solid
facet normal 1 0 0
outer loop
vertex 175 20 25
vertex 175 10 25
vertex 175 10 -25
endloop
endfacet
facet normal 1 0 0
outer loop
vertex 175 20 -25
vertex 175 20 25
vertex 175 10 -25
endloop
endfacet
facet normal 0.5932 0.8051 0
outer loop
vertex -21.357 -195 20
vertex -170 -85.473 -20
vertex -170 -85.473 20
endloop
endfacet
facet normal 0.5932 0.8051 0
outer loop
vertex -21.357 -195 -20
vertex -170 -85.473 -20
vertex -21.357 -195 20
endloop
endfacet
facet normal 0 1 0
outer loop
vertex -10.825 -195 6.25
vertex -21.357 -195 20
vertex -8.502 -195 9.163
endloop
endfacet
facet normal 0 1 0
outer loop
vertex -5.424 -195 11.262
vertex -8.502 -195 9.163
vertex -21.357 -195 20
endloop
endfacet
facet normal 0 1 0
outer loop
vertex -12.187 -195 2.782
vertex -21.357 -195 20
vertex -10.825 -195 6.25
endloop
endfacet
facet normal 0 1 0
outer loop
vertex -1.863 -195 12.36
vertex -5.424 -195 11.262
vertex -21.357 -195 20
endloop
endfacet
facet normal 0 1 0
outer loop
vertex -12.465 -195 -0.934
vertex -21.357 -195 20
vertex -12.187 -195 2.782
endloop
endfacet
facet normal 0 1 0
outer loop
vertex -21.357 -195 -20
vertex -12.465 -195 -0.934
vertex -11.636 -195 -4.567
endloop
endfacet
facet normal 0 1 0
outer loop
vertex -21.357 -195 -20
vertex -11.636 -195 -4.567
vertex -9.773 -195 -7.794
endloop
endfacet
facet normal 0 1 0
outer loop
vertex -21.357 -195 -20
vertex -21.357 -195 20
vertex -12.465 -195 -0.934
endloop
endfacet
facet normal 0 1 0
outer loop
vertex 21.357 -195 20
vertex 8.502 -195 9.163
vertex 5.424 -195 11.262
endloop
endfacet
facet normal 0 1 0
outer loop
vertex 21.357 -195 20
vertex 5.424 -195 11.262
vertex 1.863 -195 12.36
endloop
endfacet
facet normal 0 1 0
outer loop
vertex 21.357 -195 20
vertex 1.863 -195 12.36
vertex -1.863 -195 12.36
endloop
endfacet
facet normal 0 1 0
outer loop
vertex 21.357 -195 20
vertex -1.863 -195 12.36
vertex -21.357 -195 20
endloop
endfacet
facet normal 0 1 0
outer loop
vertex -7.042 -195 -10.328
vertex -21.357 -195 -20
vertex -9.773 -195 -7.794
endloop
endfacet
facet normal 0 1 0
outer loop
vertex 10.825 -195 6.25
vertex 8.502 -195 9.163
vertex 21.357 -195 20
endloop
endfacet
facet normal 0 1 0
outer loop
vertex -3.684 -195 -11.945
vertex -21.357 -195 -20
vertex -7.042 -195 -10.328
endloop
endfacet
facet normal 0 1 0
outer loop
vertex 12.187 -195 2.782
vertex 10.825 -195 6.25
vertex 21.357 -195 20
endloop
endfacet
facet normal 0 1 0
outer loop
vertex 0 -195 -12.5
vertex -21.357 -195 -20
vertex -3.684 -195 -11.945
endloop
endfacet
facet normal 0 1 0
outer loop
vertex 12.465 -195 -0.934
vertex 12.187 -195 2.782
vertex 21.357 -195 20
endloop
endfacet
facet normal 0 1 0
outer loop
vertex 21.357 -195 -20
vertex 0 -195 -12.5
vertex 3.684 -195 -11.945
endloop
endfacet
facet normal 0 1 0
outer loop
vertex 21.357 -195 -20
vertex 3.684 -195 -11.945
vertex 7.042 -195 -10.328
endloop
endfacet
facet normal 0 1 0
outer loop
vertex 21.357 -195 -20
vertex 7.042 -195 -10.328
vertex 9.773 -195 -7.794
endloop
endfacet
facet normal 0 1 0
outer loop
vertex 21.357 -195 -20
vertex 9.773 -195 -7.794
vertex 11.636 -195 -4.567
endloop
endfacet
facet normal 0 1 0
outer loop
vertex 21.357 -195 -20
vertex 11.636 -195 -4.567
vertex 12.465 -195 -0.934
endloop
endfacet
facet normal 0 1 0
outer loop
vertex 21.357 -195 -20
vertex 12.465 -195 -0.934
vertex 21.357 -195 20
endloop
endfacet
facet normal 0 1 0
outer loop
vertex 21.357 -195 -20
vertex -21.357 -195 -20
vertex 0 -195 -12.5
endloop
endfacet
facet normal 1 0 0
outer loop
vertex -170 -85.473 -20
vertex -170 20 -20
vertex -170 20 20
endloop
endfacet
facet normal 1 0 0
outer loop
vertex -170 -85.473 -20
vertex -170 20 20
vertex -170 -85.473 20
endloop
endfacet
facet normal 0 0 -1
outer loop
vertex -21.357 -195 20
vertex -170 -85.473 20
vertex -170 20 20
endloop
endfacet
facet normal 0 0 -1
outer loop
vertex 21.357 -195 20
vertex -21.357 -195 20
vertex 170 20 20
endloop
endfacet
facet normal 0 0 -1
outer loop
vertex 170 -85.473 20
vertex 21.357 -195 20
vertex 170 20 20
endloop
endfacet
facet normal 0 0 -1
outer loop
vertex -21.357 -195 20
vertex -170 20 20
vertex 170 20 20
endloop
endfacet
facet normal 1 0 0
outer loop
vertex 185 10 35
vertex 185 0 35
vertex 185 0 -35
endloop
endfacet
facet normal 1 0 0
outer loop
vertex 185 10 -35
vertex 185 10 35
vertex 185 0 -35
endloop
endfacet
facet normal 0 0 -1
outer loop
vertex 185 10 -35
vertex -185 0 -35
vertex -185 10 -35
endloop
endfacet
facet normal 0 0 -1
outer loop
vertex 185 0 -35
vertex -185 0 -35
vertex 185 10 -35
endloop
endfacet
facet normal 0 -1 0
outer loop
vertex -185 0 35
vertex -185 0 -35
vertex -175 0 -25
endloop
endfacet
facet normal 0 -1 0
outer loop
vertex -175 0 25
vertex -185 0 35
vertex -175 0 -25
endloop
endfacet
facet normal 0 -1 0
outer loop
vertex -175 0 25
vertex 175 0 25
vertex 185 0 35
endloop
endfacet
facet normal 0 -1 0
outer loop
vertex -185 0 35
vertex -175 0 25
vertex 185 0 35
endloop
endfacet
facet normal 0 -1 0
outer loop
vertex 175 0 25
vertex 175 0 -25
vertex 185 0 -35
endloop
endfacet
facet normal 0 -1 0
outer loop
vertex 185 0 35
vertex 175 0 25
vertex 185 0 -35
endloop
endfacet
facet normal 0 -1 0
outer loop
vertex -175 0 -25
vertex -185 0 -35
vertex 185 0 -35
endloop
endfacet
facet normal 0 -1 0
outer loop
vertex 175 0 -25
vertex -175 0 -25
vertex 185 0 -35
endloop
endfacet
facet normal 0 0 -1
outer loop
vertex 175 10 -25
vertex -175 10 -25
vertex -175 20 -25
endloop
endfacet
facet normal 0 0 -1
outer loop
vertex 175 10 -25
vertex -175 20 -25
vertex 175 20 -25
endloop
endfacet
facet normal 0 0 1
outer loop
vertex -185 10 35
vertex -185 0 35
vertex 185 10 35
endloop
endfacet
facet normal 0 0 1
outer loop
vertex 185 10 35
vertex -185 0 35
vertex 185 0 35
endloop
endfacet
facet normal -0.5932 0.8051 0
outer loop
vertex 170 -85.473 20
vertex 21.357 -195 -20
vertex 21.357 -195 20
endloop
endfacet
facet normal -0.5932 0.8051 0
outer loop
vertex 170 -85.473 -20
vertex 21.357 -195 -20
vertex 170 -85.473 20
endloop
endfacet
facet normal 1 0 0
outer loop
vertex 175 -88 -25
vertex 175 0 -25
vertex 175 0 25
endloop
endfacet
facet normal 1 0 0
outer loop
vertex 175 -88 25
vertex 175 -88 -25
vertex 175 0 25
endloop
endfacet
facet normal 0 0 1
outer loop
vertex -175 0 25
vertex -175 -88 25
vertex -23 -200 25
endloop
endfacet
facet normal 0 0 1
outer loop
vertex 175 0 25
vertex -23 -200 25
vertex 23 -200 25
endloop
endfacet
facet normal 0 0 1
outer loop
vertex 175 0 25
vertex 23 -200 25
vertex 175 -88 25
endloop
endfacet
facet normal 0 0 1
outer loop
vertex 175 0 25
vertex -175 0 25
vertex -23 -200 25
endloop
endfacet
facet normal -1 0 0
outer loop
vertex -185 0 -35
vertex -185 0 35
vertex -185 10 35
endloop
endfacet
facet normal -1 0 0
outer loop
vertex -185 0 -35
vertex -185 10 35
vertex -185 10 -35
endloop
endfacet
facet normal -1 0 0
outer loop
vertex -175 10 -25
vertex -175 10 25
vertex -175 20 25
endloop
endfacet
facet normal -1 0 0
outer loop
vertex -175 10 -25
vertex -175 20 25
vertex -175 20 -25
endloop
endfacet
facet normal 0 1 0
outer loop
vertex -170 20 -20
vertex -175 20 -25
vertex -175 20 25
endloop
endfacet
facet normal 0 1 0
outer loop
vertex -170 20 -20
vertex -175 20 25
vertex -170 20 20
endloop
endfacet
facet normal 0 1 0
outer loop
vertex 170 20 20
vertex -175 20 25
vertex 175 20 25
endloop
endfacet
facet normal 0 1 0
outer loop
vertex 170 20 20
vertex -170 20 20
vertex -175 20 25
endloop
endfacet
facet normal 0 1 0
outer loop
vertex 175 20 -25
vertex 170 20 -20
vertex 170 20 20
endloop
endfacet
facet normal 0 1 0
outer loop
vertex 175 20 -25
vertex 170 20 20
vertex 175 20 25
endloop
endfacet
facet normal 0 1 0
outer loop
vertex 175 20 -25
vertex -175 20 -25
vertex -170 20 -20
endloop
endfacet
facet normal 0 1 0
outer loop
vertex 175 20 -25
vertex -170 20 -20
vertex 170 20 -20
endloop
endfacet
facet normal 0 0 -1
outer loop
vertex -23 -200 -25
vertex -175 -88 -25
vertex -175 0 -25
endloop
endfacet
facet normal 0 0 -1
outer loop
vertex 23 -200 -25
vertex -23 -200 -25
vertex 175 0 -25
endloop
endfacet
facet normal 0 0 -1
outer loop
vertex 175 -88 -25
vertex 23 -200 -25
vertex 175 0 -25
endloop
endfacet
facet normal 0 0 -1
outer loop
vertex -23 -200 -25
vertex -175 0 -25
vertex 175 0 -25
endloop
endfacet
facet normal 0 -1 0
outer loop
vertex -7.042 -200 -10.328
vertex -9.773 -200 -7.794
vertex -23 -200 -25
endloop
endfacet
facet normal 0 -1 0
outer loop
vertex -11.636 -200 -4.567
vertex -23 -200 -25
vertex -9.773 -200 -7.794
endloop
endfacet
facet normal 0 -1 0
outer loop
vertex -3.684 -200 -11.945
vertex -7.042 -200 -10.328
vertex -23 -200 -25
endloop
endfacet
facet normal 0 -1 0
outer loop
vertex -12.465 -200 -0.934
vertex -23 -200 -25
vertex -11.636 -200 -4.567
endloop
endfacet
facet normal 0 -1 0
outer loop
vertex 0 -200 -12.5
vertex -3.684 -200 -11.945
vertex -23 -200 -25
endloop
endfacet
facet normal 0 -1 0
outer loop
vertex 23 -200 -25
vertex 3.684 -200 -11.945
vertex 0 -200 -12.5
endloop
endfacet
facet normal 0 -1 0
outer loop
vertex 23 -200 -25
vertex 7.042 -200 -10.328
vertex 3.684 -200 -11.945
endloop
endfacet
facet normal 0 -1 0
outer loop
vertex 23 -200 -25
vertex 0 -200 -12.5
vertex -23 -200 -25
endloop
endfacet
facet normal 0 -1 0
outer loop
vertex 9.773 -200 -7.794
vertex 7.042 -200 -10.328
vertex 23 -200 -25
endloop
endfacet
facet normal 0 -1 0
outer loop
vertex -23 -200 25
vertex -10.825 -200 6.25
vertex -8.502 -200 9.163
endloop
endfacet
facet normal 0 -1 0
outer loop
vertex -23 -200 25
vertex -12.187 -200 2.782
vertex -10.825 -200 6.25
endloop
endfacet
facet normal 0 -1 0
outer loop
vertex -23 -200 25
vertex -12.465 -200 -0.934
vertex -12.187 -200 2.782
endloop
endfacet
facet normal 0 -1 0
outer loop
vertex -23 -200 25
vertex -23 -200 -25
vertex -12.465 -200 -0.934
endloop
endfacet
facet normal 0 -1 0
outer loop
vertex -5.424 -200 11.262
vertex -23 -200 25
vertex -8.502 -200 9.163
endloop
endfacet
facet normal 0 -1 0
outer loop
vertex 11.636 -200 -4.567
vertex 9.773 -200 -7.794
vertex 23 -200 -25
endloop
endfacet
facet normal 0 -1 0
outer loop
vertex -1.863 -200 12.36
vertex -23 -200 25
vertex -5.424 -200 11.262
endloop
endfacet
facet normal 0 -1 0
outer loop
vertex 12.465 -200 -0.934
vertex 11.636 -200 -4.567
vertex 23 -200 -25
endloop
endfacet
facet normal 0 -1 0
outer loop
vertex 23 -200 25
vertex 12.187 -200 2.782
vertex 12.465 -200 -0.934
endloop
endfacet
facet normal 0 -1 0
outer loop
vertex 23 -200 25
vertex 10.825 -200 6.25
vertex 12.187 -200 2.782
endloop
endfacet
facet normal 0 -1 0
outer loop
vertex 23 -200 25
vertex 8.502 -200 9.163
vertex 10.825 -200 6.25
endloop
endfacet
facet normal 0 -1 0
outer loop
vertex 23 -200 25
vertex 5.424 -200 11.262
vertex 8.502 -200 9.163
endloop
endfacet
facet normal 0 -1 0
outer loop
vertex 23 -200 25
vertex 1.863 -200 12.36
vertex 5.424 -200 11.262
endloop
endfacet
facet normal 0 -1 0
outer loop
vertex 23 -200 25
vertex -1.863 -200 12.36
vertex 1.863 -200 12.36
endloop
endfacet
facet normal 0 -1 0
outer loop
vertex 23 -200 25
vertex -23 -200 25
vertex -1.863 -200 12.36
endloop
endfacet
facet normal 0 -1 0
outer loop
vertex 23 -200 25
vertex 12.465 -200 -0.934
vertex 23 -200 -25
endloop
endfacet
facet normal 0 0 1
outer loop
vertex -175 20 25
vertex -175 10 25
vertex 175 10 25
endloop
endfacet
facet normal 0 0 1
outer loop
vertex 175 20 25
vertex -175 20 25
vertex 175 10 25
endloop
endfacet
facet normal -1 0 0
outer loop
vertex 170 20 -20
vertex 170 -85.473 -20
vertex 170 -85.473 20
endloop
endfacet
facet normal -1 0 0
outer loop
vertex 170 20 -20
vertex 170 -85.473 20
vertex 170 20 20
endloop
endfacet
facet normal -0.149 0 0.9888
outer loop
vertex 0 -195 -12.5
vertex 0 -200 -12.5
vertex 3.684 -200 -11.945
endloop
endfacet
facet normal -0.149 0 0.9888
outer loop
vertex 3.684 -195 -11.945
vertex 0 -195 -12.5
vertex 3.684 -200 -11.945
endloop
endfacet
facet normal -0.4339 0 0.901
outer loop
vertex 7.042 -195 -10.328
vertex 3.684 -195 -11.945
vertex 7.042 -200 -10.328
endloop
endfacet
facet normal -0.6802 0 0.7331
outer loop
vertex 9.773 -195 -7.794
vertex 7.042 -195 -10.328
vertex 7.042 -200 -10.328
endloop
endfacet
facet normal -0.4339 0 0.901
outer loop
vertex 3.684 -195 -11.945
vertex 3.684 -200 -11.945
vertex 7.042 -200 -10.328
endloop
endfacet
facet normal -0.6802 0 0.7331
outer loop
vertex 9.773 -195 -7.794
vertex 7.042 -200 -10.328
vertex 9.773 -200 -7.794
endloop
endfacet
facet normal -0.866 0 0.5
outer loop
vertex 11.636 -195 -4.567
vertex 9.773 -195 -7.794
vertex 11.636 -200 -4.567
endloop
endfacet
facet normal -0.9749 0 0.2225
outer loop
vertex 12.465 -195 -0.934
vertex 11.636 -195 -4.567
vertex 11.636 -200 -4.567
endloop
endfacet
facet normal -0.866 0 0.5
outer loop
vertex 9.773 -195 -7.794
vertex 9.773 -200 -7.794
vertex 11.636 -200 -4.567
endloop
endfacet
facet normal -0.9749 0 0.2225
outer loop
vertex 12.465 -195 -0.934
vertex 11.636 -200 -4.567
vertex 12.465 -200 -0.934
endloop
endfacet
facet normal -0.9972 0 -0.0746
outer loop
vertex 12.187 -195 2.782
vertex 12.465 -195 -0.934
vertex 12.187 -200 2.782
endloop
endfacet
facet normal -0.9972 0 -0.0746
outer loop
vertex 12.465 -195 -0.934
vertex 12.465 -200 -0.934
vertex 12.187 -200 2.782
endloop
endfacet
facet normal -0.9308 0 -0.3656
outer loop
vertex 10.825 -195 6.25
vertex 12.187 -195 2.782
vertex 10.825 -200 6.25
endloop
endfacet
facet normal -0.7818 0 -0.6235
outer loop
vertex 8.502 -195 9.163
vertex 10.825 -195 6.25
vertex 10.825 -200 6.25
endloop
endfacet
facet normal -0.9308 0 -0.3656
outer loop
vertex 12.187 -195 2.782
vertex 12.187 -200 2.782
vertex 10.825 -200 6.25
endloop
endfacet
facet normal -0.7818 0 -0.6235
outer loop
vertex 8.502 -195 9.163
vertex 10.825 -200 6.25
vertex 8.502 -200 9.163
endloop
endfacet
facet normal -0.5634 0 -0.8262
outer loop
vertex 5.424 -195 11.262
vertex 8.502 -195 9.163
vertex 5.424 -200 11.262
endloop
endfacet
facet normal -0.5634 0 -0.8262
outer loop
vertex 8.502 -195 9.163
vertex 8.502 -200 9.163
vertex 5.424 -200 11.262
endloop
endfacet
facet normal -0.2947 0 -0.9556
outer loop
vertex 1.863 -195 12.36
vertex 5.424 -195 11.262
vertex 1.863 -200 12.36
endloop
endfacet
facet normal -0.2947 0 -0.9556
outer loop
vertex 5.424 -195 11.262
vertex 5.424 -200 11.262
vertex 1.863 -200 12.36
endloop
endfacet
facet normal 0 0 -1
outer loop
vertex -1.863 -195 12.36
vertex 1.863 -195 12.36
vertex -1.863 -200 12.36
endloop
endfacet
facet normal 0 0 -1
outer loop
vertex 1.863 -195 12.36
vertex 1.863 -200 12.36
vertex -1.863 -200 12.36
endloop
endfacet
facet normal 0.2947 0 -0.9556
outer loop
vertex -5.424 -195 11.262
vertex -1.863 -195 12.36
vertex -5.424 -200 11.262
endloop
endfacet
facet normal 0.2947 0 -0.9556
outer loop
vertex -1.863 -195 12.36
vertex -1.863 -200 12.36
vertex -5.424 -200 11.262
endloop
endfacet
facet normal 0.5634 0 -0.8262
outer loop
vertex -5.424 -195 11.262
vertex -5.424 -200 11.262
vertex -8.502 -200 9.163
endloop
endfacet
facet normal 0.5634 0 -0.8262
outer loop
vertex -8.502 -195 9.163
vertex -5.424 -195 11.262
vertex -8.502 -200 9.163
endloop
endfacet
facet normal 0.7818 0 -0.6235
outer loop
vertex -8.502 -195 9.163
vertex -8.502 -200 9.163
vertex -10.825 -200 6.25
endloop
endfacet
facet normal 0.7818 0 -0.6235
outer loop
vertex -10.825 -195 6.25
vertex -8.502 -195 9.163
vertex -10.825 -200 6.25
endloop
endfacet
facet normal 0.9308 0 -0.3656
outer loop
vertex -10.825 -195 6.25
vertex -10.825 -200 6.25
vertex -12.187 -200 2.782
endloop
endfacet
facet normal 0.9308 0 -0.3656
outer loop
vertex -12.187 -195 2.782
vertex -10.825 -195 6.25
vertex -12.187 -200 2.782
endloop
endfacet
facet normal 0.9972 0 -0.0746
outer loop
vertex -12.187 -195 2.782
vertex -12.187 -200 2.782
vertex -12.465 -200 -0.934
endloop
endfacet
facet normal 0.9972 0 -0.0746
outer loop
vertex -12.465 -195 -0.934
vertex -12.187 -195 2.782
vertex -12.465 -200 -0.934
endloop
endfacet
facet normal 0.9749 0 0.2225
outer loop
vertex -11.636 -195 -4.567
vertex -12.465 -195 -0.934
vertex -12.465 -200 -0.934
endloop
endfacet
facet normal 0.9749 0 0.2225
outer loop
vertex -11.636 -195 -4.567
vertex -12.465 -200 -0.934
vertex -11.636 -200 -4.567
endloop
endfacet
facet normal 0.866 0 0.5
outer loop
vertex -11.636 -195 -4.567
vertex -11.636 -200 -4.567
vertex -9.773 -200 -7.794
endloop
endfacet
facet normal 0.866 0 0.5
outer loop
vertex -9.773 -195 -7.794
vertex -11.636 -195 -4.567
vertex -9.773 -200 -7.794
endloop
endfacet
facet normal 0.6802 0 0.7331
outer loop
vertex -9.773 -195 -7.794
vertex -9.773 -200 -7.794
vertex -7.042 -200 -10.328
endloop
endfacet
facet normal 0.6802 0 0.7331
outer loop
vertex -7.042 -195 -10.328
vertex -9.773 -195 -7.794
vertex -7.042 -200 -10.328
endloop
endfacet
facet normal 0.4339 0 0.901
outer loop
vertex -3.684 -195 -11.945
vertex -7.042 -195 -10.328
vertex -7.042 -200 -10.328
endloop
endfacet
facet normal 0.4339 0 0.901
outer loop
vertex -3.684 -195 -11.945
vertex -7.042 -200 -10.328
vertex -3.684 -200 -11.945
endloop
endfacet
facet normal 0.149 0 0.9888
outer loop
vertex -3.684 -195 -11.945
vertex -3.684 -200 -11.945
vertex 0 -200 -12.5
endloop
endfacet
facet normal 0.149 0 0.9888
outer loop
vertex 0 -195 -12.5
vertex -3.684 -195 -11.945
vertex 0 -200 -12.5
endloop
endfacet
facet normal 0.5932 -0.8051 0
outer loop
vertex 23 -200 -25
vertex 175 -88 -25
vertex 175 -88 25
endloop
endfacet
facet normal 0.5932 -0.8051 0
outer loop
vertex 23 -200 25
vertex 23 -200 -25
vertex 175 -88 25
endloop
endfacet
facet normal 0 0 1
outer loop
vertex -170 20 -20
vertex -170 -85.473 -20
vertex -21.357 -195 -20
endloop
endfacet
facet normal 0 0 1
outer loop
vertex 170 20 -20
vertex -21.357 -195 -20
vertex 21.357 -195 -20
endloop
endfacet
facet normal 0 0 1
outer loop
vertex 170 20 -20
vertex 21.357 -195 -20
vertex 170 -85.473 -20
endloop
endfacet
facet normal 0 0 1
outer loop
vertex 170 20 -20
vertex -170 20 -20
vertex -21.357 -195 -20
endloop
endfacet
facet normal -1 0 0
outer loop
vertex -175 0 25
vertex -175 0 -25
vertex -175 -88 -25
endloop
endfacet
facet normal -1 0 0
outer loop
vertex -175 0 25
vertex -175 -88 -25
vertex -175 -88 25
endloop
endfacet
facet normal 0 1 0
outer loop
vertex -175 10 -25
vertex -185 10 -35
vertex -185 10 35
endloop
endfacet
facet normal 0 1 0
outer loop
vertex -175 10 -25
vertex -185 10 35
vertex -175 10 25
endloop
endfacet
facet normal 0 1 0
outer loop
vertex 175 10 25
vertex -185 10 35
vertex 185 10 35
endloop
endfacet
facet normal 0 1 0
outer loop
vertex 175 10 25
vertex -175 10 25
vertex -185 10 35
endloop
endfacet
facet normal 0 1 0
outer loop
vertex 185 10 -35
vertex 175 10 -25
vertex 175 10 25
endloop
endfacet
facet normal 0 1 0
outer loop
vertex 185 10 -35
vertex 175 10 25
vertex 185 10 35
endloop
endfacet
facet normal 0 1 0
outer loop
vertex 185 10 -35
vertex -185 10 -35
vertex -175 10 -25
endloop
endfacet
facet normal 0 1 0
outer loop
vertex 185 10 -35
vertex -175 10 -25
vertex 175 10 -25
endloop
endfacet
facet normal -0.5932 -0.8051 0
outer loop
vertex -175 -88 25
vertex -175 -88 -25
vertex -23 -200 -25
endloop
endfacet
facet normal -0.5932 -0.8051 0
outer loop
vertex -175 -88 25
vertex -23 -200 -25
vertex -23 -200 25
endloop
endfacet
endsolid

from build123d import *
from OCP.BRepFilletAPI import BRepFilletAPI_MakeChamfer

# Parameters (mm, degrees)
SKETCH_1_W          = 370
SKETCH_1_H          = 70
EXTRUDE_1_DEPTH     = 10
SKETCH_2_W          = 350
SKETCH_2_H          = 50
EXTRUDE_2_DEPTH     = 10
SKETCH_3_W          = 350
SKETCH_3_H          = 50
EXTRUDE_3_DEPTH     = 200
CHAMFER_1_SIZE      = 112
CHAMFER_1_SIZE2     = 152
SHELL_START         = -20
SHELL_1_DEPTH       = 40
SKETCH_4_R          = 12.5
CUT_EXTRUDE_1_DEPTH = 30


# Read off the part's stored shape, not the designer's step: 抽壳1
with BuildPart() as part:
    # 草图1 → 凸台-拉伸1 (new body)
    with BuildSketch(Plane(origin=(0, 0, 0), x_dir=(1, 0, 0), z_dir=(0, 1, 0))):
        Rectangle(SKETCH_1_W, SKETCH_1_H)
    extrude(amount=EXTRUDE_1_DEPTH)

    # 草图2 → 凸台-拉伸2 (add)
    with BuildSketch(Plane(origin=(0, 10, 0), x_dir=(1, 0, 0), z_dir=(0, 1, 0))):
        Rectangle(SKETCH_2_W, SKETCH_2_H)
    extrude(amount=EXTRUDE_2_DEPTH)

    # 草图3 → 凸台-拉伸3 (add)
    with BuildSketch(Plane.XZ):
        Rectangle(SKETCH_3_W, SKETCH_3_H)
    extrude(amount=EXTRUDE_3_DEPTH)

    # 倒角1: one chamfer whose edges measure the first distance from different faces: ONE call of the kernel's chamfer builder (chamfer() names one face for all edges)
    chamfer_1_edges_1 = [part.edges().sort_by_distance(p)[0] for p in [
        (-175, -200, 0),
    ]]
    chamfer_1_side_1 = [part.faces().sort_by_distance(p)[0] for p in [
        (-175, -100, 0),
    ]]
    chamfer_1_edges_2 = [part.edges().sort_by_distance(p)[0] for p in [
        (175, -200, 0),
    ]]
    chamfer_1_side_2 = [part.faces().sort_by_distance(p)[0] for p in [
        (175, -100, 0),
    ]]
    chamfer_1 = BRepFilletAPI_MakeChamfer(part.part.solid().wrapped)
    for e in chamfer_1_edges_1:
        chamfer_1.Add(CHAMFER_1_SIZE, CHAMFER_1_SIZE2, e.wrapped, chamfer_1_side_1[0].wrapped)  # the first distance lies on this face
    for e in chamfer_1_edges_2:
        chamfer_1.Add(CHAMFER_1_SIZE, CHAMFER_1_SIZE2, e.wrapped, chamfer_1_side_2[0].wrapped)  # the first distance lies on this face
    add(Compound.cast(chamfer_1.Shape()), mode=Mode.REPLACE)

    # 抽壳1 outline → 抽壳1 (cut)
    with BuildSketch(Plane.XY.offset(SHELL_START)):
        Polygon((170, -85.473461199), (170, 20), (-170, 20), (-170, -85.473461199), (-21.356840199, -195), (21.356840199, -195), align=None)
    extrude(amount=SHELL_1_DEPTH, mode=Mode.SUBTRACT)

    # 草图4 → 切除-拉伸1 (cut)
    with BuildSketch(Plane.XZ.offset(200)):
        with Locations(Location((0, 0, 0), (0, 0, 270))):
            Circle(SKETCH_4_R)
    extrude(amount=-CUT_EXTRUDE_1_DEPTH, mode=Mode.SUBTRACT)


solid = part.part
